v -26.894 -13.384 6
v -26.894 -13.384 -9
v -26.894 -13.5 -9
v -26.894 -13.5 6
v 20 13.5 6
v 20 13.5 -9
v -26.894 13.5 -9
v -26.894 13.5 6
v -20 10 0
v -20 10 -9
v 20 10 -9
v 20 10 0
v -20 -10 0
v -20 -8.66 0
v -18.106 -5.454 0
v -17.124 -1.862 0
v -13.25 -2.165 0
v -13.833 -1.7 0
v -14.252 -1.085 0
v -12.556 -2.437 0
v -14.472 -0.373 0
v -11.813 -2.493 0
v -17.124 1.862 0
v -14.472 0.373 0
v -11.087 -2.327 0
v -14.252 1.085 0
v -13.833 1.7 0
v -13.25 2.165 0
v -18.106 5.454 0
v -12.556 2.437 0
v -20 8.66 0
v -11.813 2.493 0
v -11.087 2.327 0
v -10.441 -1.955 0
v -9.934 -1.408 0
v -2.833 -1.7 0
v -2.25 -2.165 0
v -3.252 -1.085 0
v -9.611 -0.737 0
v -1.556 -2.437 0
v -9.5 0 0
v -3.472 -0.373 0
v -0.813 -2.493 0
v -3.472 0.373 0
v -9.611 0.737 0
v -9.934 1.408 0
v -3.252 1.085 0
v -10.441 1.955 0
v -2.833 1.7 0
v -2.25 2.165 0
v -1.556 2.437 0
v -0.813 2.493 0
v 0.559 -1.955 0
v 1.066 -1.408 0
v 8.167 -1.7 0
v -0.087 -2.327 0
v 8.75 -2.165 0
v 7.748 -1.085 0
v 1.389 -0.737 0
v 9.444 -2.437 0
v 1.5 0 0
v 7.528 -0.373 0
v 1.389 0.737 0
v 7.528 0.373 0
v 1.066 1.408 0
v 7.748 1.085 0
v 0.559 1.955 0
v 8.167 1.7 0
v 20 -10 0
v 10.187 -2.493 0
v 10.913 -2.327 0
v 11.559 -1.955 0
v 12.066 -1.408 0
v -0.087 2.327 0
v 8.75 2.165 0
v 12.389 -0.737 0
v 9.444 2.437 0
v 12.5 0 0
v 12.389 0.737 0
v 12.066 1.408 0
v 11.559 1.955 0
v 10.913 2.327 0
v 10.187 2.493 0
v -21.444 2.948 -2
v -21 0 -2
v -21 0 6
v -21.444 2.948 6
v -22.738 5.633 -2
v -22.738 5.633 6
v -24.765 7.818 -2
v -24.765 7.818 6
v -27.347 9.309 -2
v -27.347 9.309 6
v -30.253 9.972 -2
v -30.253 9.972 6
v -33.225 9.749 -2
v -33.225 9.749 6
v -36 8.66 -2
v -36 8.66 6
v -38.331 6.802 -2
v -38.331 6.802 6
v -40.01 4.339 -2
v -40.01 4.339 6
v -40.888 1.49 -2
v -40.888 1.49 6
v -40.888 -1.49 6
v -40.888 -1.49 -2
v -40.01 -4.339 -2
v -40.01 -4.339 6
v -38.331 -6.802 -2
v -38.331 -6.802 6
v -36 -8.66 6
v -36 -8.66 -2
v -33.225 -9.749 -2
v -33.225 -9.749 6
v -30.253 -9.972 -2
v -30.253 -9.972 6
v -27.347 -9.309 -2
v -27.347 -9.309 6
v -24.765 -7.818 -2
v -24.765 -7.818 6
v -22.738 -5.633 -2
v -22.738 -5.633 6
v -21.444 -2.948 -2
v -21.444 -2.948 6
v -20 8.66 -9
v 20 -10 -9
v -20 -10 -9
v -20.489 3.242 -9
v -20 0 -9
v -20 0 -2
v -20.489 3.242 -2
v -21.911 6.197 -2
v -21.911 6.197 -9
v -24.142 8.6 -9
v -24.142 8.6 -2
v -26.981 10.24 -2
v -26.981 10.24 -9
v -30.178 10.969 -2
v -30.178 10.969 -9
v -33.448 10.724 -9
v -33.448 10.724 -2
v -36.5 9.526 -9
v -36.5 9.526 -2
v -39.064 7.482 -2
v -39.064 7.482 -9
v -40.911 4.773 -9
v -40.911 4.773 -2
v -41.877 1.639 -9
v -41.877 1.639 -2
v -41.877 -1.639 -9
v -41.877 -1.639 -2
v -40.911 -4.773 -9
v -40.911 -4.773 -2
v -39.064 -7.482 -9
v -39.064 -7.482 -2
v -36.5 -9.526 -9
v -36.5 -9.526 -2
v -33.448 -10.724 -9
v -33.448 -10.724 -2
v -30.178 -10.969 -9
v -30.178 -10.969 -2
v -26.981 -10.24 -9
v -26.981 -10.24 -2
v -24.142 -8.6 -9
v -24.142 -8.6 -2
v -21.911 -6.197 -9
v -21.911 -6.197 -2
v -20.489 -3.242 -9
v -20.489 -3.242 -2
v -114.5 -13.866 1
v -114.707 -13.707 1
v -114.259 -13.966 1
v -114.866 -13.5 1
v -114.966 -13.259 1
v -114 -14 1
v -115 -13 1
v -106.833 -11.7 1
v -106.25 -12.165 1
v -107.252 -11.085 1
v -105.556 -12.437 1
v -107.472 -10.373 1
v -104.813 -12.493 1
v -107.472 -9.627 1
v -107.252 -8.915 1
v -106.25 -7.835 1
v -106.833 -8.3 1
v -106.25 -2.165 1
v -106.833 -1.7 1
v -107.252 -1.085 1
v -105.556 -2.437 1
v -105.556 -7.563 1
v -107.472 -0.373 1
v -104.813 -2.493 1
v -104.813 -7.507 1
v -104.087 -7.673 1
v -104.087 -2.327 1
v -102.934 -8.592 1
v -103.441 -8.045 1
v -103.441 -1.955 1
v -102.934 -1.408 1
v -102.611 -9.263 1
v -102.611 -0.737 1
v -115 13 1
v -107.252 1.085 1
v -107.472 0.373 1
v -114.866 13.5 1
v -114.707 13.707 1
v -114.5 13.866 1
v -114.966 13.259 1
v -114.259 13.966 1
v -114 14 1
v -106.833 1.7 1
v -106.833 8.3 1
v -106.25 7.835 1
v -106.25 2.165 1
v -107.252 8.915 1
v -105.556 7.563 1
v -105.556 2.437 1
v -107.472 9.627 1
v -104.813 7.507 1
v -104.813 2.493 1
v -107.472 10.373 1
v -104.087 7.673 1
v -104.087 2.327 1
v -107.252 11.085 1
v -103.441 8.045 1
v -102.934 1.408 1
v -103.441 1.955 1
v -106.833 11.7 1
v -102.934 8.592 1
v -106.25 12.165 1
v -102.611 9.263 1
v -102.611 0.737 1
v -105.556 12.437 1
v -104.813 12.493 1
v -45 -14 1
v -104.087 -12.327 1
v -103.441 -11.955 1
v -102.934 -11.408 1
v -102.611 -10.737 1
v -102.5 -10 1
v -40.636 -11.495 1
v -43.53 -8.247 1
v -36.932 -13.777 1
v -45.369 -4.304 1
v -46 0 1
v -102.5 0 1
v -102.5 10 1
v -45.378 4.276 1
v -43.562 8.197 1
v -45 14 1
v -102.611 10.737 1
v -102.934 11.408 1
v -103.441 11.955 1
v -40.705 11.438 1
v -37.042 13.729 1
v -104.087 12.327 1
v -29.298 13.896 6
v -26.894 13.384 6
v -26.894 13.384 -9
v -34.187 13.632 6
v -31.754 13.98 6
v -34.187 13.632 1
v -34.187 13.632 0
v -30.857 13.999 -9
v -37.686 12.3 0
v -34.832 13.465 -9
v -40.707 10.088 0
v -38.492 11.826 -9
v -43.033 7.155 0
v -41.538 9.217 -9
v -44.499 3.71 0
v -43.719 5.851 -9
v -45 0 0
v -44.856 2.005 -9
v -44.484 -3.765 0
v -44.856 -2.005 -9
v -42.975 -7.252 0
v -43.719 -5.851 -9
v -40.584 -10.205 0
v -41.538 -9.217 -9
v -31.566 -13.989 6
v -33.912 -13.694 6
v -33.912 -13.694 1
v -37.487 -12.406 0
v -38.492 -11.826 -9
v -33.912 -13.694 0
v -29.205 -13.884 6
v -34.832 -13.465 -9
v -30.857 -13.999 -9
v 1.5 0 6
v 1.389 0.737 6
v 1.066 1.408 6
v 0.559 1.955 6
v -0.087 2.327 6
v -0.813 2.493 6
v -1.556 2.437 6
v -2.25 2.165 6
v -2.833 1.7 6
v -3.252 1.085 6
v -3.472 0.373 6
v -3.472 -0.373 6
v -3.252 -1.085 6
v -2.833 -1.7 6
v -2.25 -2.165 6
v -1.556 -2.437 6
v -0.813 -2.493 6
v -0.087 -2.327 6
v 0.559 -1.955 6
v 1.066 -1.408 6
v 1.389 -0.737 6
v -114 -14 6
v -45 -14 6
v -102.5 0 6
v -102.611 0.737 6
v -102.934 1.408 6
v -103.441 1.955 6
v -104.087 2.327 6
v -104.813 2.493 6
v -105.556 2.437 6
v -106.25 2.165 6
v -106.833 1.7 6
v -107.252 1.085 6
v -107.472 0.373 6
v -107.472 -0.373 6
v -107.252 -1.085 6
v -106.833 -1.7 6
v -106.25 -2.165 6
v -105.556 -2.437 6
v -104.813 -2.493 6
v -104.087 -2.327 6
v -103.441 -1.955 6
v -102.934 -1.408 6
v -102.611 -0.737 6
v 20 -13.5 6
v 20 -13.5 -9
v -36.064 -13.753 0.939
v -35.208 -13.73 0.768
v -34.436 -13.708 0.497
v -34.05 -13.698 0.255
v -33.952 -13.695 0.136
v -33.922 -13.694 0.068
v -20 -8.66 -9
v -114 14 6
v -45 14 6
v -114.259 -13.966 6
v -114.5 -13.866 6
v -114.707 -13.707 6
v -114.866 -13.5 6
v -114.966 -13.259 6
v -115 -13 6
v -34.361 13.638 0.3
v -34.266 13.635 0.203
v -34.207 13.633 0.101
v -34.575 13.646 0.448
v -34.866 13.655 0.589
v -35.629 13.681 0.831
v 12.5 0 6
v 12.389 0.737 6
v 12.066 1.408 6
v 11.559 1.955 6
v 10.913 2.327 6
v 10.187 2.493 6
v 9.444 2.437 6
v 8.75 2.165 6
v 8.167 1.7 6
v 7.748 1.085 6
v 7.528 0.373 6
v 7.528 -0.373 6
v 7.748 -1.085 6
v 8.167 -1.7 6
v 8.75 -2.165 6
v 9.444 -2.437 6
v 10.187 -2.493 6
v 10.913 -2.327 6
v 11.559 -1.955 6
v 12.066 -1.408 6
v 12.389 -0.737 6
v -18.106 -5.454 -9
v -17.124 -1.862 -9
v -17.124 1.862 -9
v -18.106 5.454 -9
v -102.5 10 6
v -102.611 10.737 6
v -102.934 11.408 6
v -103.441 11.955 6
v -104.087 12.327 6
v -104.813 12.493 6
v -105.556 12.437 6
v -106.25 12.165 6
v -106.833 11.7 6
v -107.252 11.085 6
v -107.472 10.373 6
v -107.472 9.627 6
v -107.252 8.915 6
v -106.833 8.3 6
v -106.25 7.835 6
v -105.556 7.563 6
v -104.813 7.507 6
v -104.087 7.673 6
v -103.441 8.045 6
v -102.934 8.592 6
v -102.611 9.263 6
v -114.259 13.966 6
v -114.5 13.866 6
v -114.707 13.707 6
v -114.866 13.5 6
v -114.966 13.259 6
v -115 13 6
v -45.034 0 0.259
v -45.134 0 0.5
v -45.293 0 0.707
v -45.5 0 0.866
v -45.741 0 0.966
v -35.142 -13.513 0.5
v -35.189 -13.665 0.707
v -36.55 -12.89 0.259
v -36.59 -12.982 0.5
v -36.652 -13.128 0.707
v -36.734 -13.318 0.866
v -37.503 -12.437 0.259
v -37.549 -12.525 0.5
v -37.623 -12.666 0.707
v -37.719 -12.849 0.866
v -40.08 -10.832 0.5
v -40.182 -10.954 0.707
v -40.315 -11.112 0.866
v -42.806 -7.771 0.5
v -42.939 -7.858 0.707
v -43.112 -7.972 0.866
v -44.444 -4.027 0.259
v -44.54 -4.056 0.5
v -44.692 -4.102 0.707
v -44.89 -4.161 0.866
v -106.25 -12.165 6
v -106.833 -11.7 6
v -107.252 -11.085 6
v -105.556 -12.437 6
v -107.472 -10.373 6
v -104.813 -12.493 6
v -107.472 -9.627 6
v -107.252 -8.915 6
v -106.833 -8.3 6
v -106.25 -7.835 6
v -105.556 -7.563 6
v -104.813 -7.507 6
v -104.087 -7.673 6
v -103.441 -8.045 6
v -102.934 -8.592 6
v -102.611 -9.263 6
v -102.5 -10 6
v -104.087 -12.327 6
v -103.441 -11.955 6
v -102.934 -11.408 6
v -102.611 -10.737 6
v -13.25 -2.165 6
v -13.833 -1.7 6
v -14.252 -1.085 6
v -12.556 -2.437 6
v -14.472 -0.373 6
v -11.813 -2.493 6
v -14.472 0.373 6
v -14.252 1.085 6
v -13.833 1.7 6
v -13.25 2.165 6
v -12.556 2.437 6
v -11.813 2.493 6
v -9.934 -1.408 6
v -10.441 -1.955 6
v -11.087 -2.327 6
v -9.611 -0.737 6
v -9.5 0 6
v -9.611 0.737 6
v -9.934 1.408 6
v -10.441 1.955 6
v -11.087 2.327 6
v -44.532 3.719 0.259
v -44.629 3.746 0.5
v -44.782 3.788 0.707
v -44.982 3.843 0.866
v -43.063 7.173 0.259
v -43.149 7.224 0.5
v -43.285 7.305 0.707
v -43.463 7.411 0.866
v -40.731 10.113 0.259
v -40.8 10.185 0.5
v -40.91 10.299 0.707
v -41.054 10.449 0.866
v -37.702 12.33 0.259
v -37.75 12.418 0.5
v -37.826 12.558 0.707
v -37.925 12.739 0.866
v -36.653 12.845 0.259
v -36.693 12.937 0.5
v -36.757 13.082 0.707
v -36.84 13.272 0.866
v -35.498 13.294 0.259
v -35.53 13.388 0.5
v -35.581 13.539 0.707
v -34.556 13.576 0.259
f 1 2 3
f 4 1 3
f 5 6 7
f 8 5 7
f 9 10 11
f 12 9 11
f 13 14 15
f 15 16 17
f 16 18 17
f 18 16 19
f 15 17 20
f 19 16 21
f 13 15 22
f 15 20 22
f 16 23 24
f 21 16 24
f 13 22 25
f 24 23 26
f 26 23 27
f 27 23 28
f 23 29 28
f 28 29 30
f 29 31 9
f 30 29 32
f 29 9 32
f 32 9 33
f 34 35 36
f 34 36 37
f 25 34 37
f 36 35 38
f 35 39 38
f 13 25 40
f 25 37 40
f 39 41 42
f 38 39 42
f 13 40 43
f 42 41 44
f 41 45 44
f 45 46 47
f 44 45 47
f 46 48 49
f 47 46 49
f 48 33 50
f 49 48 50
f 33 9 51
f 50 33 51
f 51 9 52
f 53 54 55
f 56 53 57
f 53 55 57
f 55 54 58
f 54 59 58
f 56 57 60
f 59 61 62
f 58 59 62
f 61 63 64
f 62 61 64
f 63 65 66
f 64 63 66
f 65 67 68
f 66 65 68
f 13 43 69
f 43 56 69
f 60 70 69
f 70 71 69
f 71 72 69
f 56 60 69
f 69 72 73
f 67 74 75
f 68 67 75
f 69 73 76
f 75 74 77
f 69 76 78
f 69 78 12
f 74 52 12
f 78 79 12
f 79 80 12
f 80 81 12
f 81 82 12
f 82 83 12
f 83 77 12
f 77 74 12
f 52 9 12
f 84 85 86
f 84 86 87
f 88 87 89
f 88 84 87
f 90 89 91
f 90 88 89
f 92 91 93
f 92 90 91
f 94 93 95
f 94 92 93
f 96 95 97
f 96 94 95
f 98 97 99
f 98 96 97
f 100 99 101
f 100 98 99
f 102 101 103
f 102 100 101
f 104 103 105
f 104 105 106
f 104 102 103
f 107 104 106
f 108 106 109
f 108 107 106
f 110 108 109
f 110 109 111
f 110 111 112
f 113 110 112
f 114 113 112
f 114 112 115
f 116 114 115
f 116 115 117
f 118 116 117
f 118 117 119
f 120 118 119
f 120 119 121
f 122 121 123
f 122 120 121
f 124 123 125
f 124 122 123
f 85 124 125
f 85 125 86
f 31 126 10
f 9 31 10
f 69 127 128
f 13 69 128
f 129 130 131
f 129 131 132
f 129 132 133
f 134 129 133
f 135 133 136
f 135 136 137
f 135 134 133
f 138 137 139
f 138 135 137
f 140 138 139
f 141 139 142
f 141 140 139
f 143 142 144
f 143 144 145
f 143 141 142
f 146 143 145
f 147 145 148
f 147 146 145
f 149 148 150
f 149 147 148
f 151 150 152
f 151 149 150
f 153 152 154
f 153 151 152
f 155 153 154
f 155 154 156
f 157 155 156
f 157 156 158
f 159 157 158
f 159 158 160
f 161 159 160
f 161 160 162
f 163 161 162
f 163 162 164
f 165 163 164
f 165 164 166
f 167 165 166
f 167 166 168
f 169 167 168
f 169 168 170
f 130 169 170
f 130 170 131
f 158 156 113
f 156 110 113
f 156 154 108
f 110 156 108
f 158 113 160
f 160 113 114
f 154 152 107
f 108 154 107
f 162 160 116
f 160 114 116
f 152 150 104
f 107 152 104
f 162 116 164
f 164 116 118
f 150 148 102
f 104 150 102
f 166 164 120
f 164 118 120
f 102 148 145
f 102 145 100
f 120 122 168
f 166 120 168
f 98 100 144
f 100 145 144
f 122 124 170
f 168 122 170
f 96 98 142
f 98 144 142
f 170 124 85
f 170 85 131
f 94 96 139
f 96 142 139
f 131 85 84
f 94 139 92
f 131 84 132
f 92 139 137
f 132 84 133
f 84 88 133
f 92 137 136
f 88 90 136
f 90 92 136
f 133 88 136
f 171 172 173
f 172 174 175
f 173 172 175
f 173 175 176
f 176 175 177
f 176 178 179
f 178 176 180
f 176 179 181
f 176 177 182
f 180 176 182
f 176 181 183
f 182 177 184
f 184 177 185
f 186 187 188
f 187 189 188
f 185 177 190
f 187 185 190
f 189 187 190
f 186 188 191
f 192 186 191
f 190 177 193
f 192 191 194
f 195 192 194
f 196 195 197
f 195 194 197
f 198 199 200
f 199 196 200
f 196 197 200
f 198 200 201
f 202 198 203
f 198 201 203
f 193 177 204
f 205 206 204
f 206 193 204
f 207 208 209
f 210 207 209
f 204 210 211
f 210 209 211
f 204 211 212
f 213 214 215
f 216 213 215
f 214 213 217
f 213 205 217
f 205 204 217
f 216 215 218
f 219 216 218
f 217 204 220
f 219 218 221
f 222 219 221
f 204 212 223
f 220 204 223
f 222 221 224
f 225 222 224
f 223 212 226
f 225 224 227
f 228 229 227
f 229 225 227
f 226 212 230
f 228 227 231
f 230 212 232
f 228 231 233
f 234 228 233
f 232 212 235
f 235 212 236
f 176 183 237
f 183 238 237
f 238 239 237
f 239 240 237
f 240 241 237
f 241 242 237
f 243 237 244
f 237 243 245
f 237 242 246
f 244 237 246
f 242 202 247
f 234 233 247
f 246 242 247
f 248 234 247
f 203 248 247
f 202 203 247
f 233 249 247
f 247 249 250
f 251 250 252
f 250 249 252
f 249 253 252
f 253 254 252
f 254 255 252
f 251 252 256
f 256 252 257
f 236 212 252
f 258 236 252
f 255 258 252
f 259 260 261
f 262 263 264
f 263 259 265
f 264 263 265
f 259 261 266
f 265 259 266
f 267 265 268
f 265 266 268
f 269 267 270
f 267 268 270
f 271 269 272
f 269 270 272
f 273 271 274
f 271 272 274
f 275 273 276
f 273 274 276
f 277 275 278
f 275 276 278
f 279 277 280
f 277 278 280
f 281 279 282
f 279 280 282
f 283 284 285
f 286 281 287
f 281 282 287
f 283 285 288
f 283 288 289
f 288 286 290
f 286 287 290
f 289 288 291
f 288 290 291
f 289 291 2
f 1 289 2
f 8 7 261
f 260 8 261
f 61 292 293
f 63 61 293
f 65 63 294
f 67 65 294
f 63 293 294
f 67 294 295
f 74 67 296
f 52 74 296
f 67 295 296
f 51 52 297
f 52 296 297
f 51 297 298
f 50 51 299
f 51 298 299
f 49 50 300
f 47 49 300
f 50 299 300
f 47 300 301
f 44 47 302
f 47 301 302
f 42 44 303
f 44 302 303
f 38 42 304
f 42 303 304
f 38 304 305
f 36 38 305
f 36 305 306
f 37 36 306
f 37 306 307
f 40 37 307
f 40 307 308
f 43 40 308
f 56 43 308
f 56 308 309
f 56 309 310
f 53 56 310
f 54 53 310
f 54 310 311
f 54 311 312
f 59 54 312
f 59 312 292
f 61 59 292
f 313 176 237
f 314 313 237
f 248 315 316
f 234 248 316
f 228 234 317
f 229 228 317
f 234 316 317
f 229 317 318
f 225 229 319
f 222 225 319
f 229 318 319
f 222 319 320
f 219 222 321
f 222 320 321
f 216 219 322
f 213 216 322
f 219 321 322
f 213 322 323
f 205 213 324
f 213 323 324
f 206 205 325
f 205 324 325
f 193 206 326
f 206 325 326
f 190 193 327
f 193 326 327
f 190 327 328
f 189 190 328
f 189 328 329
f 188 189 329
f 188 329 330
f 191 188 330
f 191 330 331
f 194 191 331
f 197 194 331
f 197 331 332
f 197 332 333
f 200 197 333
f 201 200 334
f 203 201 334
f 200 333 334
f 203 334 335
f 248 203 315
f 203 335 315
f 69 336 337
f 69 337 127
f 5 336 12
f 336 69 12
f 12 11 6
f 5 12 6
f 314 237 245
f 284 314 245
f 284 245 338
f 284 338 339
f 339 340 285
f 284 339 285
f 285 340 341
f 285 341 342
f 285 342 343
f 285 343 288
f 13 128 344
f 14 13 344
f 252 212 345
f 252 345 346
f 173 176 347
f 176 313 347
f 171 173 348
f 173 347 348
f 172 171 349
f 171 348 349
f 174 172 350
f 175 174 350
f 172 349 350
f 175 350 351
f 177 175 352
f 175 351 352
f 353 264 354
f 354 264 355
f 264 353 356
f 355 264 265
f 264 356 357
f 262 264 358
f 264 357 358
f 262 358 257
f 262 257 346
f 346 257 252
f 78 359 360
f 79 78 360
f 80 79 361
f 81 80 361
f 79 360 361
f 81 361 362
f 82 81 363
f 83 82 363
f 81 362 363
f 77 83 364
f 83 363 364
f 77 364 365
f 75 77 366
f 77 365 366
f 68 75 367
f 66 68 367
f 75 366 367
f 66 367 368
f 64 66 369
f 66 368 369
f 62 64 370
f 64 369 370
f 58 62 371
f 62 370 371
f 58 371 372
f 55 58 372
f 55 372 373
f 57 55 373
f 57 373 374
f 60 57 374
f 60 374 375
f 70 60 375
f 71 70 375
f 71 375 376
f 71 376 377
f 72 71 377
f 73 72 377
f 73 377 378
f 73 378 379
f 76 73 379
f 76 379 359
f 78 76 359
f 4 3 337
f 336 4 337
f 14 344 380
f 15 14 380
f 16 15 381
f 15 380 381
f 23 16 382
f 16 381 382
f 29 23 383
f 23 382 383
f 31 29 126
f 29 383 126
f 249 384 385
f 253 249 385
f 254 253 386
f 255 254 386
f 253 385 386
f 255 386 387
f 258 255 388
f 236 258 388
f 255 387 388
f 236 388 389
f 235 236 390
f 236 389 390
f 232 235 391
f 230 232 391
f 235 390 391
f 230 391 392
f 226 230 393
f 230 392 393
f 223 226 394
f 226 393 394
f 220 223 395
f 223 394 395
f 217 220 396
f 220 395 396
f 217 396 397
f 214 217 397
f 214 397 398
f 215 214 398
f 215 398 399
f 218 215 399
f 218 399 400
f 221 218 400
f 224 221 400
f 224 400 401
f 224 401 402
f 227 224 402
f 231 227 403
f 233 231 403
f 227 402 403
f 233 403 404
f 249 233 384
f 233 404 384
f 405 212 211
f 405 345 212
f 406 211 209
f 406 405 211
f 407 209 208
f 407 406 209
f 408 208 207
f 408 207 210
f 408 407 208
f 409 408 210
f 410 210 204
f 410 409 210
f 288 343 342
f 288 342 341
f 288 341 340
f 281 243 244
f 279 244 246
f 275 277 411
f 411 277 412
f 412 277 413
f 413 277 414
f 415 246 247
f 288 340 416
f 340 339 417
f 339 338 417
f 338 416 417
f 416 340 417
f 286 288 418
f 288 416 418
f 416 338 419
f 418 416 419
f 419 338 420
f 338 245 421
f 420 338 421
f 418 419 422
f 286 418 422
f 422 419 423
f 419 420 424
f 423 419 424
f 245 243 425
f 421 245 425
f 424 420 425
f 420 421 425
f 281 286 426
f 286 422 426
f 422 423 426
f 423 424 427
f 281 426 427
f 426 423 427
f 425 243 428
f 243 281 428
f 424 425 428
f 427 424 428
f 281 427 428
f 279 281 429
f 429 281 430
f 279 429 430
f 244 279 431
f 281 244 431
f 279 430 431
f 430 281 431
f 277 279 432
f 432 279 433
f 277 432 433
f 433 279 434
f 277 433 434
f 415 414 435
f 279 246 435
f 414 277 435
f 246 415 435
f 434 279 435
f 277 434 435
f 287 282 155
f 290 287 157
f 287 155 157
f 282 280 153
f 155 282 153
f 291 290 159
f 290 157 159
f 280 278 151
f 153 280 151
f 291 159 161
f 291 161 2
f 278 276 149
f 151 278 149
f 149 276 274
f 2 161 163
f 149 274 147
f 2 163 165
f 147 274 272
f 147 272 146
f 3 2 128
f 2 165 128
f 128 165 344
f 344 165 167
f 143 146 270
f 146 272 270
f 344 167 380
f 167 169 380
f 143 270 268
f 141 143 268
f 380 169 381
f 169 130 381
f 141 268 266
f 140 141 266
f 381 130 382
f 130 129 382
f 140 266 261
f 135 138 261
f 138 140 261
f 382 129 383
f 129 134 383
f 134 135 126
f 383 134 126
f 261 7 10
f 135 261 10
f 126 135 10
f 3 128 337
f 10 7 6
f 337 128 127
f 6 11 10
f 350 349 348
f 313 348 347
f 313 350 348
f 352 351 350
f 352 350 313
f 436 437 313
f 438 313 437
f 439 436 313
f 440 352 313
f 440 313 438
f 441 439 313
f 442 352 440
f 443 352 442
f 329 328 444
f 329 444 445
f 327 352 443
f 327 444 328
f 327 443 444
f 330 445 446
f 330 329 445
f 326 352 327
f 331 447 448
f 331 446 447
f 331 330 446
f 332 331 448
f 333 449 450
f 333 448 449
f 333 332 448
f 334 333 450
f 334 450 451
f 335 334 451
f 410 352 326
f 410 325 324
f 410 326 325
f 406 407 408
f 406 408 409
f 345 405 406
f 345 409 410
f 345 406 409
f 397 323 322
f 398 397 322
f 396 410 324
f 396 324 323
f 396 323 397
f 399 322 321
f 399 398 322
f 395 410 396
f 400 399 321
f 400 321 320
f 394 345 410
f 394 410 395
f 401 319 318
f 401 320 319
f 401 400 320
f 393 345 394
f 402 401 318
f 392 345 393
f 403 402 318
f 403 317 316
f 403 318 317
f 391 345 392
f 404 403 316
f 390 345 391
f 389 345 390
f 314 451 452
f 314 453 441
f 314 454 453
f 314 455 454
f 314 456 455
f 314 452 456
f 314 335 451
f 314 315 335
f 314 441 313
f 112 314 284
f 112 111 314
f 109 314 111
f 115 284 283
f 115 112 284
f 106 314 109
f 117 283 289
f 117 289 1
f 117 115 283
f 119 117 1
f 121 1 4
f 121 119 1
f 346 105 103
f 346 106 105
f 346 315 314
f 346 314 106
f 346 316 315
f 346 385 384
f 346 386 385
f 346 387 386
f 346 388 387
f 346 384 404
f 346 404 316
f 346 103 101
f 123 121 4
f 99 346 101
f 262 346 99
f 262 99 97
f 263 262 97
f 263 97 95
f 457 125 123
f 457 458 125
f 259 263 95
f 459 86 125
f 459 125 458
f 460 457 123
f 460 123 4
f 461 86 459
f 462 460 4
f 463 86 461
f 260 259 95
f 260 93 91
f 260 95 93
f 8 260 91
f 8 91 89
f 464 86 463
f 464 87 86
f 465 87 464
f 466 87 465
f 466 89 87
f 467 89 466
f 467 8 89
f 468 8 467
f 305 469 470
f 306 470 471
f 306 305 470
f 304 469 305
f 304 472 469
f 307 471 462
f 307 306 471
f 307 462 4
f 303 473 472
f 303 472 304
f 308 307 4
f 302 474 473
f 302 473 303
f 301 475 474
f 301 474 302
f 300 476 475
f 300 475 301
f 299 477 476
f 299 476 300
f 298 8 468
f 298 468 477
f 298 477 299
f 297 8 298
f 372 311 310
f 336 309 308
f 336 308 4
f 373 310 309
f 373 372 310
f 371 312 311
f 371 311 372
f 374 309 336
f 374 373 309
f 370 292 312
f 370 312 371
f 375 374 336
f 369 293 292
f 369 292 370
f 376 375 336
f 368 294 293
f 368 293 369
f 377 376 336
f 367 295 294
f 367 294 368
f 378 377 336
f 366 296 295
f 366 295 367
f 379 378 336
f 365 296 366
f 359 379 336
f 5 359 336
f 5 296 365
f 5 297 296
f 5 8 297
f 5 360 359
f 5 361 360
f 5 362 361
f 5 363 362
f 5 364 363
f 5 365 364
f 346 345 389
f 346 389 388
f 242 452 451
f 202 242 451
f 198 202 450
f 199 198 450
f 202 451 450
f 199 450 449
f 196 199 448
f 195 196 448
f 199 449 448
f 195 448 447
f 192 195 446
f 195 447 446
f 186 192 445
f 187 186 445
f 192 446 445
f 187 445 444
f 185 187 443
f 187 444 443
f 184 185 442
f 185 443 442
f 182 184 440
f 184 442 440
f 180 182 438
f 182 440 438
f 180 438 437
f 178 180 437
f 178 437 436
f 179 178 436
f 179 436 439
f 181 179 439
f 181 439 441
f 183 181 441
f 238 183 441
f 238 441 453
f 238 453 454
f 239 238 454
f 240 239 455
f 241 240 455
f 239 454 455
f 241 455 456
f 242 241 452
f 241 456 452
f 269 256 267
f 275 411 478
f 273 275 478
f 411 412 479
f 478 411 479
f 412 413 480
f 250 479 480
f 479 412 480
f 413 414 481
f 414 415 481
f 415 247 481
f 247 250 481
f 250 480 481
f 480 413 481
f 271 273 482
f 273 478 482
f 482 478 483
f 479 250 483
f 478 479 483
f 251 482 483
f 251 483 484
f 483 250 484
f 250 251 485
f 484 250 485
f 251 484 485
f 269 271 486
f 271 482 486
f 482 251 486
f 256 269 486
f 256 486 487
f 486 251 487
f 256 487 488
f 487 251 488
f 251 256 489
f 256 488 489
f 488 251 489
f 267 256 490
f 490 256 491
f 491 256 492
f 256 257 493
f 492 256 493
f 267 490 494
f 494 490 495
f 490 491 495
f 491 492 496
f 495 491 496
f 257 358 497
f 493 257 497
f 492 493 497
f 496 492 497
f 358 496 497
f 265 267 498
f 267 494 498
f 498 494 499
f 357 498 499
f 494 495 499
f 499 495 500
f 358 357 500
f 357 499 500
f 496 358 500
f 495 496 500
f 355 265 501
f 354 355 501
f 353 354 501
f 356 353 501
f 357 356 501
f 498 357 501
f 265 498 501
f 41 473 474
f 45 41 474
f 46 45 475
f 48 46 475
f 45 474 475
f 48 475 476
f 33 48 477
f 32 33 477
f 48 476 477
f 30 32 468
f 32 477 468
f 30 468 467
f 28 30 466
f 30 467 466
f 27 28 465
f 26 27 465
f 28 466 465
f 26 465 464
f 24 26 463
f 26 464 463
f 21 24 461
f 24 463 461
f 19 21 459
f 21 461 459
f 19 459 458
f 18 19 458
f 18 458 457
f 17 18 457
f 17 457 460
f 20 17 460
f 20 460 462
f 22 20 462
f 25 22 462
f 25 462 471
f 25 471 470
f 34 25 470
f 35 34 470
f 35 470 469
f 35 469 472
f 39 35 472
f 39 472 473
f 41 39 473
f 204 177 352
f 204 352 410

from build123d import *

# Parameters (mm, degrees)
SKETCH_1_W          = 40
SKETCH_1_H          = 20
EXTRUDE_1_DEPTH     = 6
SKETCH_2_R          = 2.5
CUT_EXTRUDE_1_DEPTH = 24.151673806
SKETCH_3_R          = 11
EXTRUDE_2_DEPTH     = 15
SKETCH_5_R          = 11
SKETCH_5_R_2        = 10
EXTRUDE_3_DEPTH     = 8
EXTRUDE_4_DEPTH     = 5
FILLET_1_R          = 1
FILLET_2_R          = 1
SKETCH_9_R          = 2.5
CUT_EXTRUDE_2_DEPTH = 5


with BuildPart() as part:
    # 草图1 → 凸台-拉伸1 (new body)
    with BuildSketch(Plane.XY):
        Rectangle(SKETCH_1_W, SKETCH_1_H)
    extrude(amount=EXTRUDE_1_DEPTH)

    # 草图2 → 切除-拉伸1 (cut, through all)
    with BuildSketch(Plane.XY.offset(6)):
        with Locations((10, 0)):
            Circle(SKETCH_2_R)
        with Locations((-1, 0)):
            Circle(SKETCH_2_R)
        with Locations((-12, 0)):
            Circle(SKETCH_2_R)
    extrude(amount=-CUT_EXTRUDE_1_DEPTH, mode=Mode.SUBTRACT)

    # 草图3 → 凸台-拉伸2 (add)
    with BuildSketch(Plane.XY.offset(6)):
        with BuildLine():
            Line((20, 10), (20, 13.5))
            Line((20, 13.5), (-26.893967141, 13.5))
            Line((-26.893967141, 13.5), (-26.893967141, 13.384337644))
            ThreePointArc((-26.893967141, 13.384337644), (-45, 0), (-26.893967141, -13.384337644))
            Line((-26.893967141, -13.384337644), (-26.893967141, -13.5))
            Line((-26.893967141, -13.5), (20, -13.5))
            Line((20, -13.5), (20, -10))
            Line((20, -10), (-20, -10))
            Line((-20, -10), (-20, -8.660254038))
            ThreePointArc((-20, -8.660254038), (-17, 0), (-20, 8.660254038))
            Line((-20, 8.660254038), (-20, 10))
            Line((-20, 10), (20, 10))
        make_face()
        with Locations((-31, 0)):
            Circle(SKETCH_3_R, mode=Mode.SUBTRACT)
    extrude(amount=-EXTRUDE_2_DEPTH)

    # 草图5 → 凸台-拉伸3 (add)
    with BuildSketch(Plane.XY.offset(6)):
        with Locations((-31, 0)):
            Circle(SKETCH_5_R)
        with Locations((-31, 0)):
            Circle(SKETCH_5_R_2, mode=Mode.SUBTRACT)
    extrude(amount=-EXTRUDE_3_DEPTH)

    # 草图8 → 凸台-拉伸4 (add)
    with BuildSketch(Plane.XY.offset(6)):
        with BuildLine():
            ThreePointArc((-33.911999365, -13.693803697), (-44.999289152, -0.141078849), (-34.187380521, 13.632336755))
            Line((-34.187380521, 13.632336755), (-45, 14))
            Line((-45, 14), (-115, 14))
            Line((-115, 14), (-115, -14))
            Line((-115, -14), (-45, -14))
            Line((-45, -14), (-33.911999365, -13.693803697))
        make_face()
    extrude(amount=-EXTRUDE_4_DEPTH)

    # 圆角1
    fillet_1_edges = [part.edges().sort_by_distance(p)[0] for p in [
        (-44.999289152, -0.141078849, 1),
    ]]
    fillet(fillet_1_edges, radius=FILLET_1_R)

    # 圆角2
    fillet_2_edges = [part.edges().sort_by_distance(p)[0] for p in [
        (-115, 14, 3.5),
        (-115, -14, 3.5),
    ]]
    fillet(fillet_2_edges, radius=FILLET_2_R)

    # 草图9 → 切除-拉伸2 (cut)
    with BuildSketch(Plane.XY.offset(6)):
        with Locations((-105, 0)):
            Circle(SKETCH_9_R)
        with Locations((-105, 10)):
            Circle(SKETCH_9_R)
        with Locations((-105, -10)):
            Circle(SKETCH_9_R)
    extrude(amount=-CUT_EXTRUDE_2_DEPTH, mode=Mode.SUBTRACT)


solid = part.part
